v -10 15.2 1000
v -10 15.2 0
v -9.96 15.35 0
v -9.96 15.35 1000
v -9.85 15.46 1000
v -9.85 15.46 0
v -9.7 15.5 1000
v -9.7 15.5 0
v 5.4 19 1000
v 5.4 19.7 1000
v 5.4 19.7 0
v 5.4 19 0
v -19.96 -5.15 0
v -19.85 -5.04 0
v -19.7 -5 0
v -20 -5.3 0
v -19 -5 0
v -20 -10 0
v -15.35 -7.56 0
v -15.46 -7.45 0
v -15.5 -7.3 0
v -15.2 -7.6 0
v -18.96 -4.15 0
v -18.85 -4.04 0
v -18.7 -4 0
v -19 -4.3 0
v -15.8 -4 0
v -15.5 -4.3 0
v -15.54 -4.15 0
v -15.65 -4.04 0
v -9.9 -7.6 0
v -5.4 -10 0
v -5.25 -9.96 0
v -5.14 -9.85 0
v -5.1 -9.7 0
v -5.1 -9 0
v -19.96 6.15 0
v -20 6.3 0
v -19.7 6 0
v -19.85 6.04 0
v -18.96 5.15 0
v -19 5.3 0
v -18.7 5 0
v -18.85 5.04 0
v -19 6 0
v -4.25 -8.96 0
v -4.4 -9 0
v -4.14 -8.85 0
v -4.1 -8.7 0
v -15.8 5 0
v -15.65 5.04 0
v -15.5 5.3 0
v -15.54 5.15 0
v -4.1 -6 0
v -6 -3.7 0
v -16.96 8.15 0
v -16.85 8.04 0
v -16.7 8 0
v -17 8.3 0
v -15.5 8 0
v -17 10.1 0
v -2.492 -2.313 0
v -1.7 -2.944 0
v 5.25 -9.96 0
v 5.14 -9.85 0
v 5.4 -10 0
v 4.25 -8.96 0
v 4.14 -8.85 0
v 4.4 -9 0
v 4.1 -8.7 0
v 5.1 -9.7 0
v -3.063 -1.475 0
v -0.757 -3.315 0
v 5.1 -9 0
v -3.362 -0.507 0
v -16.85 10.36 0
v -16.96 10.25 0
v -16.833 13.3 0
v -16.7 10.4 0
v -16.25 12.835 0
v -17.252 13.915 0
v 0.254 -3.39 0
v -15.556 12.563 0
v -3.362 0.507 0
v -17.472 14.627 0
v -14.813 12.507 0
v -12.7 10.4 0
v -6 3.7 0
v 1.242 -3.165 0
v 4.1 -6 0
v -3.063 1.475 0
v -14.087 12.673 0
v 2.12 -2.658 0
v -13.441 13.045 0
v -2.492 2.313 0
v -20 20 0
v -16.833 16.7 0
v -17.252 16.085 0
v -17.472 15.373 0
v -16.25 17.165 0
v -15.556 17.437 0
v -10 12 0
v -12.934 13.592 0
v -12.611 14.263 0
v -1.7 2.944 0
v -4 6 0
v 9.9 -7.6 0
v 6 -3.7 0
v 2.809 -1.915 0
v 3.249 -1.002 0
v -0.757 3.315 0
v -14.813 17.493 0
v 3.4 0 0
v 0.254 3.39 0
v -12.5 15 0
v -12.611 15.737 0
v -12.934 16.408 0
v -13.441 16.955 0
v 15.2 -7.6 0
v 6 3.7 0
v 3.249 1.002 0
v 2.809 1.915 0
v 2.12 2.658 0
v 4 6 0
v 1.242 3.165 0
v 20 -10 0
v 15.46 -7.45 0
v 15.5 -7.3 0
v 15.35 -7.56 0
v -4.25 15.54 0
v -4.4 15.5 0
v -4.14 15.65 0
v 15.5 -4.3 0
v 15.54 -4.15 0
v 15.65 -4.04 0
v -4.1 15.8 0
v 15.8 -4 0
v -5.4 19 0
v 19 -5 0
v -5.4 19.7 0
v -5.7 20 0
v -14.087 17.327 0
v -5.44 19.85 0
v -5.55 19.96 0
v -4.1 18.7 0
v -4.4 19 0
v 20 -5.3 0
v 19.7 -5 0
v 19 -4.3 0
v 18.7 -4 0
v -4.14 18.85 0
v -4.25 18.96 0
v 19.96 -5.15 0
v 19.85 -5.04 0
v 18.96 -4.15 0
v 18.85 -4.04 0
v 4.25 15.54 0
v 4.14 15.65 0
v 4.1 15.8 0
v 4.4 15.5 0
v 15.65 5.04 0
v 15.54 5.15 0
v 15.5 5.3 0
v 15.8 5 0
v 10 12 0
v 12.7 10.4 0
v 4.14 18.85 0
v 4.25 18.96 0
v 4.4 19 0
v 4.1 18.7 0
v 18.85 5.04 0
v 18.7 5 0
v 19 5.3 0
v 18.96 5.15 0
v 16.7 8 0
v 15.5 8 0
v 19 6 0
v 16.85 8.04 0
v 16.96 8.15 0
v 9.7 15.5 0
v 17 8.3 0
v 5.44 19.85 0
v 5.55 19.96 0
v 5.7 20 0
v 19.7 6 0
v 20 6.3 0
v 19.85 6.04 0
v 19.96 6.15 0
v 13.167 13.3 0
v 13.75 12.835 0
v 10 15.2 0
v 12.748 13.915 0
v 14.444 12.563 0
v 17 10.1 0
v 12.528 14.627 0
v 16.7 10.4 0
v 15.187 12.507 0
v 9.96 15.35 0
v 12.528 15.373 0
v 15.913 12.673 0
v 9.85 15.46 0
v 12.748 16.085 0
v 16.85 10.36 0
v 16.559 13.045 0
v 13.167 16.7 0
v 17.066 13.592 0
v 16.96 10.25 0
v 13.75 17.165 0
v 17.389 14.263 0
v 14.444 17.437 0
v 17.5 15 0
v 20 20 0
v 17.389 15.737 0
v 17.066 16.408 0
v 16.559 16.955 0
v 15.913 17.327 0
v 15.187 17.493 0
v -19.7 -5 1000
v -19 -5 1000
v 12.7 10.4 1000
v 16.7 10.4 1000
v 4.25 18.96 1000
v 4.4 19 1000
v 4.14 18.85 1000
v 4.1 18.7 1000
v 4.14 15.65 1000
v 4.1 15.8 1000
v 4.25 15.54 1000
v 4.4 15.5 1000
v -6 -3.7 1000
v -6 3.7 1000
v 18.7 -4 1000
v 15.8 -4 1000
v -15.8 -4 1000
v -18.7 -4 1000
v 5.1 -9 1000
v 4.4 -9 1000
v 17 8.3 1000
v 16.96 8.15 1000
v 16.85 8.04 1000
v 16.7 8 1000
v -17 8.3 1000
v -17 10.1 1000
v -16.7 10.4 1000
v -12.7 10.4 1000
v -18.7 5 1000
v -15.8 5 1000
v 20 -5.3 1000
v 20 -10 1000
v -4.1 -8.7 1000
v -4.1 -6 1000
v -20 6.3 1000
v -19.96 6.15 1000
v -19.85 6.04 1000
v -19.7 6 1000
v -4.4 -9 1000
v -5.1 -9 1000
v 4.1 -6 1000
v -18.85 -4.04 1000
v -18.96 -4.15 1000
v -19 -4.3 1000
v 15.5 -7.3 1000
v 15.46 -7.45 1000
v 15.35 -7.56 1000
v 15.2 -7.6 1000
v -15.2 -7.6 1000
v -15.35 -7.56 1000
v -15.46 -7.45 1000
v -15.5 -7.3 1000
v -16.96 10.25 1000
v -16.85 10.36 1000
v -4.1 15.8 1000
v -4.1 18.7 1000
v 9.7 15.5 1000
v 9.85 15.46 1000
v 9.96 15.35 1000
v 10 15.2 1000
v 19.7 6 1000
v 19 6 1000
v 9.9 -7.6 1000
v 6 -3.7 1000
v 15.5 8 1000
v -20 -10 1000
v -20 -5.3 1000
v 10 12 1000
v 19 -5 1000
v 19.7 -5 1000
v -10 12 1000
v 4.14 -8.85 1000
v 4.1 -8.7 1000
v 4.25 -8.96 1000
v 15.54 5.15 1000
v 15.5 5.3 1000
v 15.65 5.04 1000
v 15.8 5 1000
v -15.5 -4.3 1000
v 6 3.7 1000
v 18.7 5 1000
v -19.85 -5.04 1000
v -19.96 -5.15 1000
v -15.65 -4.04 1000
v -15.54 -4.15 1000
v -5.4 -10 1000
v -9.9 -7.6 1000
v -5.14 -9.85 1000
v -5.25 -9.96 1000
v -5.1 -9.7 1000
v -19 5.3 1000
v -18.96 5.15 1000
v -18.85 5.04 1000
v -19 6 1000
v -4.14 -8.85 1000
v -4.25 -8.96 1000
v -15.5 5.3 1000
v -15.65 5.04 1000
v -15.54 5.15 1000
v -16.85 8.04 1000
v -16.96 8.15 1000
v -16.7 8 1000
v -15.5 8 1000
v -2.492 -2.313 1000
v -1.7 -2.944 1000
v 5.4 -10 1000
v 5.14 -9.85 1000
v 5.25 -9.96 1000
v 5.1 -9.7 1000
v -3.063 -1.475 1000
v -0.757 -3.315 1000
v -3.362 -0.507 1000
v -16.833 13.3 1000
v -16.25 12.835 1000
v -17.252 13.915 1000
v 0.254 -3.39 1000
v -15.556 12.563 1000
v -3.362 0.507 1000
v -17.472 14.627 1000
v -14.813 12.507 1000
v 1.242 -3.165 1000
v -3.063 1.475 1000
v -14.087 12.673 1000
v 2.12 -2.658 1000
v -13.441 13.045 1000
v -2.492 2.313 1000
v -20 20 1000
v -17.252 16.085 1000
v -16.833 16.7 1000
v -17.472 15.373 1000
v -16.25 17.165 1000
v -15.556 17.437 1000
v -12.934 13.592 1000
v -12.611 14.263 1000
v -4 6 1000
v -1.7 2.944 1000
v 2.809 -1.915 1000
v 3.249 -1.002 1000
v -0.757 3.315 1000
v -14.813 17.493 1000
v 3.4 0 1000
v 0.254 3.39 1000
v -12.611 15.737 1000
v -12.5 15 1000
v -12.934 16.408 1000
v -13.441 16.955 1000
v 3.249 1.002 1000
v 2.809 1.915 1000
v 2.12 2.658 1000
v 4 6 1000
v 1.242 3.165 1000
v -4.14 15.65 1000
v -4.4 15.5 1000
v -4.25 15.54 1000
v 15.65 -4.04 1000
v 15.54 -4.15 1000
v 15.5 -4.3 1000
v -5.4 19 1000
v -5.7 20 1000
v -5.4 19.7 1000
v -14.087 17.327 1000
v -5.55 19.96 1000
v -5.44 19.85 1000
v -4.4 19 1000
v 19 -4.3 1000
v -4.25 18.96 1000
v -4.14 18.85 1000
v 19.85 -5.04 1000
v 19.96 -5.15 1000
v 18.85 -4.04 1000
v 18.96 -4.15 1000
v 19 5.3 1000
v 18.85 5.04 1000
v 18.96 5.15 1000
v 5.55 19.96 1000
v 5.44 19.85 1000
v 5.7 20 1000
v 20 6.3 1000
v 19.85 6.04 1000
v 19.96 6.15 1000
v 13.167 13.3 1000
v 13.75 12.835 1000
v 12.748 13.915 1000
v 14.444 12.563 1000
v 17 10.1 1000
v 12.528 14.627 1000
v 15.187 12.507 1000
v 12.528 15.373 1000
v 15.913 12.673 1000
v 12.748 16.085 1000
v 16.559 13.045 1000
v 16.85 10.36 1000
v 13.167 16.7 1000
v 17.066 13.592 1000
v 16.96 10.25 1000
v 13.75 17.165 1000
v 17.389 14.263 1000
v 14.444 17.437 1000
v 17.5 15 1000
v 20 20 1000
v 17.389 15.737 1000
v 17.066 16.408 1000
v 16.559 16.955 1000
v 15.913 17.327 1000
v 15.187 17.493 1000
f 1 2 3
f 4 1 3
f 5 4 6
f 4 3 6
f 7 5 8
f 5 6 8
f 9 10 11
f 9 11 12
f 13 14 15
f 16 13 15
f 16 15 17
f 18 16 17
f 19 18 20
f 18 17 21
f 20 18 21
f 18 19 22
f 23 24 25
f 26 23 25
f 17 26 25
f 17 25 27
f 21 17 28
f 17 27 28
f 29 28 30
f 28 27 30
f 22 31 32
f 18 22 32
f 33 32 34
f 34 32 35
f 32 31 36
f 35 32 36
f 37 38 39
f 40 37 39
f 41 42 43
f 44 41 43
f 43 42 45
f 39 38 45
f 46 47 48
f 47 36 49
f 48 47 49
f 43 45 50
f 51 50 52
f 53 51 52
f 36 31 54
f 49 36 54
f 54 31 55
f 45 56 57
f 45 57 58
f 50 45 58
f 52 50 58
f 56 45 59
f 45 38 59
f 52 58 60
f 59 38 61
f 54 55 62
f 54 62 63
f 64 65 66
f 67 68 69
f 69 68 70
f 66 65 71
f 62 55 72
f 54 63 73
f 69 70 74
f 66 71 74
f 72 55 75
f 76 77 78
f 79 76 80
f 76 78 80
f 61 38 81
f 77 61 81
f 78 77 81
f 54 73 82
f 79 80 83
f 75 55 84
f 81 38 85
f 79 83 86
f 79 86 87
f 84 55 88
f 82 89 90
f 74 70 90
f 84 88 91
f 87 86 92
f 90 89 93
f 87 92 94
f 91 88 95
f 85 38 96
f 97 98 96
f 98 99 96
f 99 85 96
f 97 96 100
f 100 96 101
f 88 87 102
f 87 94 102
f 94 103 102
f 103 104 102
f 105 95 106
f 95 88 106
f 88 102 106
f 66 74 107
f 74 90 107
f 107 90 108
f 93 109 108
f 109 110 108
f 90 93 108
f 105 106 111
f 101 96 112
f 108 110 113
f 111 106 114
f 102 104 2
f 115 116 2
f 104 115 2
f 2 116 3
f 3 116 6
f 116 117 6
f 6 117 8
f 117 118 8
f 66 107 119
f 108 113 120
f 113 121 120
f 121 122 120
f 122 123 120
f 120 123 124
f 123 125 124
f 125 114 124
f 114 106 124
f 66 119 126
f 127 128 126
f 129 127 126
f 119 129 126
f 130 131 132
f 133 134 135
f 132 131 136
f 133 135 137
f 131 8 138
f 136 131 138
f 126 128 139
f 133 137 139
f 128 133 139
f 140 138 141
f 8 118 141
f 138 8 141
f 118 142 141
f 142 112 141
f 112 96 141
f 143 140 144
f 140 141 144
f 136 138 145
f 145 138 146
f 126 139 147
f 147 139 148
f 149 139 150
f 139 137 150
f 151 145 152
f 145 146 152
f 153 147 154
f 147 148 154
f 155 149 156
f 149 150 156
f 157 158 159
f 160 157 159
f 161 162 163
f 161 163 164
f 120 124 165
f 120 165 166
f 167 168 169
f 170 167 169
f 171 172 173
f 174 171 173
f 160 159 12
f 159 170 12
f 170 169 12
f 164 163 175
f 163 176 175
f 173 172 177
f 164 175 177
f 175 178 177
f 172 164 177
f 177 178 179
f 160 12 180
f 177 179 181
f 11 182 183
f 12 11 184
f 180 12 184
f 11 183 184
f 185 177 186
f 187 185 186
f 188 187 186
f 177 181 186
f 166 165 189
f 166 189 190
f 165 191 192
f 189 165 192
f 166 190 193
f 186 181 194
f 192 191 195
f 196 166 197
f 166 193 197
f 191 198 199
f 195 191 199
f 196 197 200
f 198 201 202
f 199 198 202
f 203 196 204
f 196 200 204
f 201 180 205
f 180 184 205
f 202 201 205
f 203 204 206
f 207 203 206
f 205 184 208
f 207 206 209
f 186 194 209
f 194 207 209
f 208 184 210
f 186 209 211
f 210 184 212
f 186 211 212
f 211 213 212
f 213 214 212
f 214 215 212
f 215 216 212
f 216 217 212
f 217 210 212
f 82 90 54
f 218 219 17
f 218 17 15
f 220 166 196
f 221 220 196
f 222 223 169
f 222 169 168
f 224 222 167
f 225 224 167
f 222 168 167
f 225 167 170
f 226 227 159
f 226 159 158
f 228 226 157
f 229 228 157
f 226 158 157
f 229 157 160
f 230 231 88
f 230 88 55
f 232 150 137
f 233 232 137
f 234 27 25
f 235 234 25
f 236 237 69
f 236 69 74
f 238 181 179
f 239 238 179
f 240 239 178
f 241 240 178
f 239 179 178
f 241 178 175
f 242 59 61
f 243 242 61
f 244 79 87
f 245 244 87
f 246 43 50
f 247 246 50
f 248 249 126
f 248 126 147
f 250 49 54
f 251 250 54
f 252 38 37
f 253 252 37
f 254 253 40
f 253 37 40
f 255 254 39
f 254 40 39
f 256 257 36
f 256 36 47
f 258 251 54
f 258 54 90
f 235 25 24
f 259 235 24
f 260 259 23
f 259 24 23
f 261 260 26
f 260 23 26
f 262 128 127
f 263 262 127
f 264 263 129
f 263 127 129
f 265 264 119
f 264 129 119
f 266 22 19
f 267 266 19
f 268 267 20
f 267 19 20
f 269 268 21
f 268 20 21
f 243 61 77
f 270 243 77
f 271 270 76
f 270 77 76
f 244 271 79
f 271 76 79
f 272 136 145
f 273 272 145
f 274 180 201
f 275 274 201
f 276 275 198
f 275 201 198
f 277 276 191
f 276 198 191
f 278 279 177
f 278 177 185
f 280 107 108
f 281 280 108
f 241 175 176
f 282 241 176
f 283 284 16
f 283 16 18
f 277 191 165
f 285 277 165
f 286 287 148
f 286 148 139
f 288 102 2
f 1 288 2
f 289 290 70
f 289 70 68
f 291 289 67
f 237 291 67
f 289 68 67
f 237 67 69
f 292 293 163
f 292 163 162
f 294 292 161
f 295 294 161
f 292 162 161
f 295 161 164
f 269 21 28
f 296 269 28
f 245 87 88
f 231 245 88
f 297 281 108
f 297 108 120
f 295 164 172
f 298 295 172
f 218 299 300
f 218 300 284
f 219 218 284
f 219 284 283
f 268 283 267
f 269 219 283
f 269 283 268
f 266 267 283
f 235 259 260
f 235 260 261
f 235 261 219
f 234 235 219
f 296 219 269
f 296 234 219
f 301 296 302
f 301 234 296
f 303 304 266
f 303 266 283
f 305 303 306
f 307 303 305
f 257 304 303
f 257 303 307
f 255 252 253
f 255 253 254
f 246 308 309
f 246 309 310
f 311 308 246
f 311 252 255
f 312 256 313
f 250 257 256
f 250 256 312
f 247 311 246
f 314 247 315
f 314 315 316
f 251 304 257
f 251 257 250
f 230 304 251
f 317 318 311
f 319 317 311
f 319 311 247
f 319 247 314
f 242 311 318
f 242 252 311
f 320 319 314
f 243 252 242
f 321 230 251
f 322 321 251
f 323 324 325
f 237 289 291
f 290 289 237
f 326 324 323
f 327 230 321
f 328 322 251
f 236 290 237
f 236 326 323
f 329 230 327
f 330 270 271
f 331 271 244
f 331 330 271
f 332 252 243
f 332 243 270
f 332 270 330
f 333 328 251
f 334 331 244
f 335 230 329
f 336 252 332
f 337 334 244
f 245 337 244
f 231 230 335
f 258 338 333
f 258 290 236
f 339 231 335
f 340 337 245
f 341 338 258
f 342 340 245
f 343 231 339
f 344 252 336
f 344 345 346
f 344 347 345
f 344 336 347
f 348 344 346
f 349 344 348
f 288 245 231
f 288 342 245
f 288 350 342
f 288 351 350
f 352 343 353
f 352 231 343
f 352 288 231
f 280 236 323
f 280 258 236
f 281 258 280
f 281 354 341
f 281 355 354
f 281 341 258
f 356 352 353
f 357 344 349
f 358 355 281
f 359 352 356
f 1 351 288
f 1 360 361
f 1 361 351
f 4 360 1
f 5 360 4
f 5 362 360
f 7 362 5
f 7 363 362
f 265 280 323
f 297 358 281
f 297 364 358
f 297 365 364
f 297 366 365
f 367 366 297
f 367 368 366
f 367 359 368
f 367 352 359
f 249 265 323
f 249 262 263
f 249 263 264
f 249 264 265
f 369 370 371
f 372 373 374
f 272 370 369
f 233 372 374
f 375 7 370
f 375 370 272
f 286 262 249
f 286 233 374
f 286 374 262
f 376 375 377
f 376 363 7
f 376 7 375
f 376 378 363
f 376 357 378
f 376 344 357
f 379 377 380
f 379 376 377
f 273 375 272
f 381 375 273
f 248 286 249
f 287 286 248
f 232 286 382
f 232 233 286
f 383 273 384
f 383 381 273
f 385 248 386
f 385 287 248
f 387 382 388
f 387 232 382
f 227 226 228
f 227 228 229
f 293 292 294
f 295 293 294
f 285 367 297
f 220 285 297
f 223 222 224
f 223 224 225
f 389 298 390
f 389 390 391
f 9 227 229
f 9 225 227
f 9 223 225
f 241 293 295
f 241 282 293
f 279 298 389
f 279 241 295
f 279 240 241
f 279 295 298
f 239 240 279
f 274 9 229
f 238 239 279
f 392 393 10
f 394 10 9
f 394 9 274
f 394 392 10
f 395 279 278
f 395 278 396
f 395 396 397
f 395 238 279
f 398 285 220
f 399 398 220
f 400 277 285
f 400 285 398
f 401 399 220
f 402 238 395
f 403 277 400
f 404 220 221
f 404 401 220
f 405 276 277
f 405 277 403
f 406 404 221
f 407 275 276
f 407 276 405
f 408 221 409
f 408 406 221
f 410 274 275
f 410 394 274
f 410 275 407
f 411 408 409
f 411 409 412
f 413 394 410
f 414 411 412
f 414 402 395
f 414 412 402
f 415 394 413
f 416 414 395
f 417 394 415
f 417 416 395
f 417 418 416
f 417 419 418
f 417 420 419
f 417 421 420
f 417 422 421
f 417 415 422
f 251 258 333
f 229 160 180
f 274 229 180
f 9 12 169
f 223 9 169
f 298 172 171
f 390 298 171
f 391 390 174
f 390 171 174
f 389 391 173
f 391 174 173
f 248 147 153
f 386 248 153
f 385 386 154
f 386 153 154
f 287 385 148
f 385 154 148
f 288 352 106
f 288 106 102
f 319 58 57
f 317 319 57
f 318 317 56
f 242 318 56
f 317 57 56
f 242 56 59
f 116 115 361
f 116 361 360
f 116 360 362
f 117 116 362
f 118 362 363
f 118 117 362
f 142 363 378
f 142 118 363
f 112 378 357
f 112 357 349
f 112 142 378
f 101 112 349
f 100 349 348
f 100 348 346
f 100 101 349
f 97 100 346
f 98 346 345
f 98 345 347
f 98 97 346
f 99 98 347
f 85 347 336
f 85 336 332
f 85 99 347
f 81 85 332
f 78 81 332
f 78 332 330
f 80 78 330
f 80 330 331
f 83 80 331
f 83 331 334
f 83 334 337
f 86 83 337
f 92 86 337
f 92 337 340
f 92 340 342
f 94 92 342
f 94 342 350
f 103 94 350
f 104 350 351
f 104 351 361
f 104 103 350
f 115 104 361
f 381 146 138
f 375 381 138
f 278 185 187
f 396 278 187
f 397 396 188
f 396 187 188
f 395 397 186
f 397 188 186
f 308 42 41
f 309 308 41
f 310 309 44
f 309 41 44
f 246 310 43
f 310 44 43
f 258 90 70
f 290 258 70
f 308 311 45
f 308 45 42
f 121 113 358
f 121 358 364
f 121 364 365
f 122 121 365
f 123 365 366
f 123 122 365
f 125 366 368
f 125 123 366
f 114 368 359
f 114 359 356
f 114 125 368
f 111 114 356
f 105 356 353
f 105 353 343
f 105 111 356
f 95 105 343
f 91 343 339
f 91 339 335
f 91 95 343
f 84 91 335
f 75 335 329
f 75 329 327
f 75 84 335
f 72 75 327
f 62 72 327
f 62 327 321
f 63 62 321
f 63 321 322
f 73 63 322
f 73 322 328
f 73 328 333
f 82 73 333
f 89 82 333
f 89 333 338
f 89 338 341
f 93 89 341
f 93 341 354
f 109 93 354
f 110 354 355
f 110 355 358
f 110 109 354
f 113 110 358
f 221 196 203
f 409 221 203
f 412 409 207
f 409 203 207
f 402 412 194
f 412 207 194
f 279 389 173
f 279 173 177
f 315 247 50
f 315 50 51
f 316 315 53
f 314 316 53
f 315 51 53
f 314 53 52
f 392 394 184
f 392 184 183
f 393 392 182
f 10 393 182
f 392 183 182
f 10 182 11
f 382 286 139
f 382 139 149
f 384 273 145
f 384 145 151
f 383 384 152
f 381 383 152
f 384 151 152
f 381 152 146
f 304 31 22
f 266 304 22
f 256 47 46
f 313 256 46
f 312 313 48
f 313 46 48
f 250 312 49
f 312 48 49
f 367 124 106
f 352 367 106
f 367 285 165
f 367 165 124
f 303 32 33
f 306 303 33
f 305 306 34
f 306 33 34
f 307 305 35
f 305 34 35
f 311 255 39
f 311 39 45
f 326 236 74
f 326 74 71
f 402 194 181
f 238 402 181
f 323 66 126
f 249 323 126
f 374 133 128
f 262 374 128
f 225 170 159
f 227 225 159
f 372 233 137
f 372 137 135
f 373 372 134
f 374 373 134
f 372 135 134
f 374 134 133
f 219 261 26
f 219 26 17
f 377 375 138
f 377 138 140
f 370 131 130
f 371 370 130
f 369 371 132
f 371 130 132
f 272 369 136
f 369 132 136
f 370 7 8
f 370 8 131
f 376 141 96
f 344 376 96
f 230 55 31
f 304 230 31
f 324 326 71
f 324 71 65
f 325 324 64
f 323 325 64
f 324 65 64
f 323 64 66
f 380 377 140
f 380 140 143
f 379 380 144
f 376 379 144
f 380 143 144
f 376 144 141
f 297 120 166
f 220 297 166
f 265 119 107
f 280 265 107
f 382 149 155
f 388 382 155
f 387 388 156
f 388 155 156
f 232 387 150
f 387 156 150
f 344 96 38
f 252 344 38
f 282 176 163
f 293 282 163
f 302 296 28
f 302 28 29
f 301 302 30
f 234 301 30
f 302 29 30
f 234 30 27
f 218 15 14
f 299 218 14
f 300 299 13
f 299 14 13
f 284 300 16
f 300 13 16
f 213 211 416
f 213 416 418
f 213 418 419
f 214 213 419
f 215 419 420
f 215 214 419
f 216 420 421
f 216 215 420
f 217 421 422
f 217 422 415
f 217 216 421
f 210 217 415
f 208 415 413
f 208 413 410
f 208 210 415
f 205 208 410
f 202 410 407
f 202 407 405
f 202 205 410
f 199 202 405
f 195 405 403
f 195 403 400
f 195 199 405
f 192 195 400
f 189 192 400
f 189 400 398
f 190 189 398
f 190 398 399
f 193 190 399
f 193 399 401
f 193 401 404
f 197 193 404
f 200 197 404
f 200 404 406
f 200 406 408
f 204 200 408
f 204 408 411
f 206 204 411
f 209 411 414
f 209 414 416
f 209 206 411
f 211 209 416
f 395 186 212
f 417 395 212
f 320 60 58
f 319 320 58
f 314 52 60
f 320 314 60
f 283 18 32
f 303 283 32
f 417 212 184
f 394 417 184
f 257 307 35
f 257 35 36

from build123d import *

# Parameters (mm, degrees)
SKETCH_1_R      = 3.4
SKETCH_1_R_2    = 2.5
EXTRUDE_1_DEPTH = 1000


with BuildPart() as part:
    # Эскиз1 → Бобышка-Вытянуть1 (new body)
    with BuildSketch(Plane.XY):
        with BuildLine():
            Line((-10, 20), (-20, 20))
            Line((-20, 20), (-20, 6.3))
            ThreePointArc((-20, 6.3), (-19.912132034, 6.087867966), (-19.7, 6))
            Line((-19.7, 6), (-19, 6))
            Line((-19, 6), (-19, 5.3))
            ThreePointArc((-19, 5.3), (-18.912132034, 5.087867966), (-18.7, 5))
            Line((-18.7, 5), (-15.8, 5))
            ThreePointArc((-15.8, 5), (-15.587867966, 5.087867966), (-15.5, 5.3))
            Line((-15.5, 5.3), (-15.5, 8))
            Line((-15.5, 8), (-16.7, 8))
            ThreePointArc((-16.7, 8), (-16.912132034, 8.087867966), (-17, 8.3))
            Line((-17, 8.3), (-17, 10.1))
            ThreePointArc((-17, 10.1), (-16.912132034, 10.312132034), (-16.7, 10.4))
            Line((-16.7, 10.4), (-12.7, 10.4))
            Line((-12.7, 10.4), (-6, 3.7))
            Line((-6, 3.7), (-6, -3.7))
            Line((-6, -3.7), (-9.9, -7.6))
            Line((-9.9, -7.6), (-15.2, -7.6))
            ThreePointArc((-15.2, -7.6), (-15.412132034, -7.512132034), (-15.5, -7.3))
            Line((-15.5, -7.3), (-15.5, -4.3))
            ThreePointArc((-15.5, -4.3), (-15.587867966, -4.087867966), (-15.8, -4))
            Line((-15.8, -4), (-18.7, -4))
            ThreePointArc((-18.7, -4), (-18.912132034, -4.087867966), (-19, -4.3))
            Line((-19, -4.3), (-19, -5))
            Line((-19, -5), (-19.7, -5))
            ThreePointArc((-19.7, -5), (-19.912132034, -5.087867966), (-20, -5.3))
            Line((-20, -5.3), (-20, -10))
            Line((-20, -10), (-5.4, -10))
            ThreePointArc((-5.4, -10), (-5.187867966, -9.912132034), (-5.1, -9.7))
            Line((-5.1, -9.7), (-5.1, -9))
            Line((-5.1, -9), (-4.4, -9))
            ThreePointArc((-4.4, -9), (-4.187867966, -8.912132034), (-4.1, -8.7))
            Line((-4.1, -8.7), (-4.1, -6))
            Line((-4.1, -6), (4.1, -6))
            Line((4.1, -6), (4.1, -8.7))
            ThreePointArc((4.1, -8.7), (4.187867966, -8.912132034), (4.4, -9))
            Line((4.4, -9), (5.1, -9))
            Line((5.1, -9), (5.1, -9.7))
            ThreePointArc((5.1, -9.7), (5.187867966, -9.912132034), (5.4, -10))
            Line((5.4, -10), (20, -10))
            Line((20, -10), (20, -5.3))
            ThreePointArc((20, -5.3), (19.912132034, -5.087867966), (19.7, -5))
            Line((19.7, -5), (19, -5))
            Line((19, -5), (19, -4.3))
            ThreePointArc((19, -4.3), (18.912132034, -4.087867966), (18.7, -4))
            Line((18.7, -4), (15.8, -4))
            ThreePointArc((15.8, -4), (15.587867966, -4.087867966), (15.5, -4.3))
            Line((15.5, -4.3), (15.5, -7.3))
            ThreePointArc((15.5, -7.3), (15.412132034, -7.512132034), (15.2, -7.6))
            Line((15.2, -7.6), (9.9, -7.6))
            Line((9.9, -7.6), (6, -3.7))
            Line((6, -3.7), (6, 3.7))
            Line((6, 3.7), (12.7, 10.4))
            Line((12.7, 10.4), (16.7, 10.4))
            ThreePointArc((16.7, 10.4), (16.912132034, 10.312132034), (17, 10.1))
            Line((17, 10.1), (17, 8.3))
            ThreePointArc((17, 8.3), (16.912132034, 8.087867966), (16.7, 8))
            Line((16.7, 8), (15.5, 8))
            Line((15.5, 8), (15.5, 5.3))
            ThreePointArc((15.5, 5.3), (15.587867966, 5.087867966), (15.8, 5))
            Line((15.8, 5), (18.7, 5))
            ThreePointArc((18.7, 5), (18.912132034, 5.087867966), (19, 5.3))
            Line((19, 5.3), (19, 6))
            Line((19, 6), (19.7, 6))
            ThreePointArc((19.7, 6), (19.912132034, 6.087867966), (20, 6.3))
            Line((20, 6.3), (20, 20))
            Line((20, 20), (10, 20))
            Line((10, 20), (5.7, 20))
            ThreePointArc((5.7, 20), (5.487867966, 19.912132034), (5.4, 19.7))
            Line((5.4, 19.7), (5.4, 19))
            Line((5.4, 19), (4.4, 19))
            ThreePointArc((4.4, 19), (4.187867966, 18.912132034), (4.1, 18.7))
            Line((4.1, 18.7), (4.1, 15.8))
            ThreePointArc((4.1, 15.8), (4.187867966, 15.587867966), (4.4, 15.5))
            Line((4.4, 15.5), (9.7, 15.5))
            ThreePointArc((9.7, 15.5), (9.912132034, 15.412132034), (10, 15.2))
            Line((10, 15.2), (10, 12))
            Line((10, 12), (4, 6))
            Line((4, 6), (-4, 6))
            Line((-4, 6), (-10, 12))
            Line((-10, 12), (-10, 15.2))
            ThreePointArc((-10, 15.2), (-9.912132034, 15.412132034), (-9.7, 15.5))
            Line((-9.7, 15.5), (-4.4, 15.5))
            ThreePointArc((-4.4, 15.5), (-4.187867966, 15.587867966), (-4.1, 15.8))
            Line((-4.1, 15.8), (-4.1, 18.7))
            ThreePointArc((-4.1, 18.7), (-4.187867966, 18.912132034), (-4.4, 19))
            Line((-4.4, 19), (-5.4, 19))
            Line((-5.4, 19), (-5.4, 19.7))
            ThreePointArc((-5.4, 19.7), (-5.487867966, 19.912132034), (-5.7, 20))
            Line((-5.7, 20), (-10, 20))
        make_face()
        Circle(SKETCH_1_R, mode=Mode.SUBTRACT)
        with Locations((15, 15)):
            Circle(SKETCH_1_R_2, mode=Mode.SUBTRACT)
        with Locations((-15, 15)):
            Circle(SKETCH_1_R_2, mode=Mode.SUBTRACT)
    extrude(amount=EXTRUDE_1_DEPTH)


solid = part.part
